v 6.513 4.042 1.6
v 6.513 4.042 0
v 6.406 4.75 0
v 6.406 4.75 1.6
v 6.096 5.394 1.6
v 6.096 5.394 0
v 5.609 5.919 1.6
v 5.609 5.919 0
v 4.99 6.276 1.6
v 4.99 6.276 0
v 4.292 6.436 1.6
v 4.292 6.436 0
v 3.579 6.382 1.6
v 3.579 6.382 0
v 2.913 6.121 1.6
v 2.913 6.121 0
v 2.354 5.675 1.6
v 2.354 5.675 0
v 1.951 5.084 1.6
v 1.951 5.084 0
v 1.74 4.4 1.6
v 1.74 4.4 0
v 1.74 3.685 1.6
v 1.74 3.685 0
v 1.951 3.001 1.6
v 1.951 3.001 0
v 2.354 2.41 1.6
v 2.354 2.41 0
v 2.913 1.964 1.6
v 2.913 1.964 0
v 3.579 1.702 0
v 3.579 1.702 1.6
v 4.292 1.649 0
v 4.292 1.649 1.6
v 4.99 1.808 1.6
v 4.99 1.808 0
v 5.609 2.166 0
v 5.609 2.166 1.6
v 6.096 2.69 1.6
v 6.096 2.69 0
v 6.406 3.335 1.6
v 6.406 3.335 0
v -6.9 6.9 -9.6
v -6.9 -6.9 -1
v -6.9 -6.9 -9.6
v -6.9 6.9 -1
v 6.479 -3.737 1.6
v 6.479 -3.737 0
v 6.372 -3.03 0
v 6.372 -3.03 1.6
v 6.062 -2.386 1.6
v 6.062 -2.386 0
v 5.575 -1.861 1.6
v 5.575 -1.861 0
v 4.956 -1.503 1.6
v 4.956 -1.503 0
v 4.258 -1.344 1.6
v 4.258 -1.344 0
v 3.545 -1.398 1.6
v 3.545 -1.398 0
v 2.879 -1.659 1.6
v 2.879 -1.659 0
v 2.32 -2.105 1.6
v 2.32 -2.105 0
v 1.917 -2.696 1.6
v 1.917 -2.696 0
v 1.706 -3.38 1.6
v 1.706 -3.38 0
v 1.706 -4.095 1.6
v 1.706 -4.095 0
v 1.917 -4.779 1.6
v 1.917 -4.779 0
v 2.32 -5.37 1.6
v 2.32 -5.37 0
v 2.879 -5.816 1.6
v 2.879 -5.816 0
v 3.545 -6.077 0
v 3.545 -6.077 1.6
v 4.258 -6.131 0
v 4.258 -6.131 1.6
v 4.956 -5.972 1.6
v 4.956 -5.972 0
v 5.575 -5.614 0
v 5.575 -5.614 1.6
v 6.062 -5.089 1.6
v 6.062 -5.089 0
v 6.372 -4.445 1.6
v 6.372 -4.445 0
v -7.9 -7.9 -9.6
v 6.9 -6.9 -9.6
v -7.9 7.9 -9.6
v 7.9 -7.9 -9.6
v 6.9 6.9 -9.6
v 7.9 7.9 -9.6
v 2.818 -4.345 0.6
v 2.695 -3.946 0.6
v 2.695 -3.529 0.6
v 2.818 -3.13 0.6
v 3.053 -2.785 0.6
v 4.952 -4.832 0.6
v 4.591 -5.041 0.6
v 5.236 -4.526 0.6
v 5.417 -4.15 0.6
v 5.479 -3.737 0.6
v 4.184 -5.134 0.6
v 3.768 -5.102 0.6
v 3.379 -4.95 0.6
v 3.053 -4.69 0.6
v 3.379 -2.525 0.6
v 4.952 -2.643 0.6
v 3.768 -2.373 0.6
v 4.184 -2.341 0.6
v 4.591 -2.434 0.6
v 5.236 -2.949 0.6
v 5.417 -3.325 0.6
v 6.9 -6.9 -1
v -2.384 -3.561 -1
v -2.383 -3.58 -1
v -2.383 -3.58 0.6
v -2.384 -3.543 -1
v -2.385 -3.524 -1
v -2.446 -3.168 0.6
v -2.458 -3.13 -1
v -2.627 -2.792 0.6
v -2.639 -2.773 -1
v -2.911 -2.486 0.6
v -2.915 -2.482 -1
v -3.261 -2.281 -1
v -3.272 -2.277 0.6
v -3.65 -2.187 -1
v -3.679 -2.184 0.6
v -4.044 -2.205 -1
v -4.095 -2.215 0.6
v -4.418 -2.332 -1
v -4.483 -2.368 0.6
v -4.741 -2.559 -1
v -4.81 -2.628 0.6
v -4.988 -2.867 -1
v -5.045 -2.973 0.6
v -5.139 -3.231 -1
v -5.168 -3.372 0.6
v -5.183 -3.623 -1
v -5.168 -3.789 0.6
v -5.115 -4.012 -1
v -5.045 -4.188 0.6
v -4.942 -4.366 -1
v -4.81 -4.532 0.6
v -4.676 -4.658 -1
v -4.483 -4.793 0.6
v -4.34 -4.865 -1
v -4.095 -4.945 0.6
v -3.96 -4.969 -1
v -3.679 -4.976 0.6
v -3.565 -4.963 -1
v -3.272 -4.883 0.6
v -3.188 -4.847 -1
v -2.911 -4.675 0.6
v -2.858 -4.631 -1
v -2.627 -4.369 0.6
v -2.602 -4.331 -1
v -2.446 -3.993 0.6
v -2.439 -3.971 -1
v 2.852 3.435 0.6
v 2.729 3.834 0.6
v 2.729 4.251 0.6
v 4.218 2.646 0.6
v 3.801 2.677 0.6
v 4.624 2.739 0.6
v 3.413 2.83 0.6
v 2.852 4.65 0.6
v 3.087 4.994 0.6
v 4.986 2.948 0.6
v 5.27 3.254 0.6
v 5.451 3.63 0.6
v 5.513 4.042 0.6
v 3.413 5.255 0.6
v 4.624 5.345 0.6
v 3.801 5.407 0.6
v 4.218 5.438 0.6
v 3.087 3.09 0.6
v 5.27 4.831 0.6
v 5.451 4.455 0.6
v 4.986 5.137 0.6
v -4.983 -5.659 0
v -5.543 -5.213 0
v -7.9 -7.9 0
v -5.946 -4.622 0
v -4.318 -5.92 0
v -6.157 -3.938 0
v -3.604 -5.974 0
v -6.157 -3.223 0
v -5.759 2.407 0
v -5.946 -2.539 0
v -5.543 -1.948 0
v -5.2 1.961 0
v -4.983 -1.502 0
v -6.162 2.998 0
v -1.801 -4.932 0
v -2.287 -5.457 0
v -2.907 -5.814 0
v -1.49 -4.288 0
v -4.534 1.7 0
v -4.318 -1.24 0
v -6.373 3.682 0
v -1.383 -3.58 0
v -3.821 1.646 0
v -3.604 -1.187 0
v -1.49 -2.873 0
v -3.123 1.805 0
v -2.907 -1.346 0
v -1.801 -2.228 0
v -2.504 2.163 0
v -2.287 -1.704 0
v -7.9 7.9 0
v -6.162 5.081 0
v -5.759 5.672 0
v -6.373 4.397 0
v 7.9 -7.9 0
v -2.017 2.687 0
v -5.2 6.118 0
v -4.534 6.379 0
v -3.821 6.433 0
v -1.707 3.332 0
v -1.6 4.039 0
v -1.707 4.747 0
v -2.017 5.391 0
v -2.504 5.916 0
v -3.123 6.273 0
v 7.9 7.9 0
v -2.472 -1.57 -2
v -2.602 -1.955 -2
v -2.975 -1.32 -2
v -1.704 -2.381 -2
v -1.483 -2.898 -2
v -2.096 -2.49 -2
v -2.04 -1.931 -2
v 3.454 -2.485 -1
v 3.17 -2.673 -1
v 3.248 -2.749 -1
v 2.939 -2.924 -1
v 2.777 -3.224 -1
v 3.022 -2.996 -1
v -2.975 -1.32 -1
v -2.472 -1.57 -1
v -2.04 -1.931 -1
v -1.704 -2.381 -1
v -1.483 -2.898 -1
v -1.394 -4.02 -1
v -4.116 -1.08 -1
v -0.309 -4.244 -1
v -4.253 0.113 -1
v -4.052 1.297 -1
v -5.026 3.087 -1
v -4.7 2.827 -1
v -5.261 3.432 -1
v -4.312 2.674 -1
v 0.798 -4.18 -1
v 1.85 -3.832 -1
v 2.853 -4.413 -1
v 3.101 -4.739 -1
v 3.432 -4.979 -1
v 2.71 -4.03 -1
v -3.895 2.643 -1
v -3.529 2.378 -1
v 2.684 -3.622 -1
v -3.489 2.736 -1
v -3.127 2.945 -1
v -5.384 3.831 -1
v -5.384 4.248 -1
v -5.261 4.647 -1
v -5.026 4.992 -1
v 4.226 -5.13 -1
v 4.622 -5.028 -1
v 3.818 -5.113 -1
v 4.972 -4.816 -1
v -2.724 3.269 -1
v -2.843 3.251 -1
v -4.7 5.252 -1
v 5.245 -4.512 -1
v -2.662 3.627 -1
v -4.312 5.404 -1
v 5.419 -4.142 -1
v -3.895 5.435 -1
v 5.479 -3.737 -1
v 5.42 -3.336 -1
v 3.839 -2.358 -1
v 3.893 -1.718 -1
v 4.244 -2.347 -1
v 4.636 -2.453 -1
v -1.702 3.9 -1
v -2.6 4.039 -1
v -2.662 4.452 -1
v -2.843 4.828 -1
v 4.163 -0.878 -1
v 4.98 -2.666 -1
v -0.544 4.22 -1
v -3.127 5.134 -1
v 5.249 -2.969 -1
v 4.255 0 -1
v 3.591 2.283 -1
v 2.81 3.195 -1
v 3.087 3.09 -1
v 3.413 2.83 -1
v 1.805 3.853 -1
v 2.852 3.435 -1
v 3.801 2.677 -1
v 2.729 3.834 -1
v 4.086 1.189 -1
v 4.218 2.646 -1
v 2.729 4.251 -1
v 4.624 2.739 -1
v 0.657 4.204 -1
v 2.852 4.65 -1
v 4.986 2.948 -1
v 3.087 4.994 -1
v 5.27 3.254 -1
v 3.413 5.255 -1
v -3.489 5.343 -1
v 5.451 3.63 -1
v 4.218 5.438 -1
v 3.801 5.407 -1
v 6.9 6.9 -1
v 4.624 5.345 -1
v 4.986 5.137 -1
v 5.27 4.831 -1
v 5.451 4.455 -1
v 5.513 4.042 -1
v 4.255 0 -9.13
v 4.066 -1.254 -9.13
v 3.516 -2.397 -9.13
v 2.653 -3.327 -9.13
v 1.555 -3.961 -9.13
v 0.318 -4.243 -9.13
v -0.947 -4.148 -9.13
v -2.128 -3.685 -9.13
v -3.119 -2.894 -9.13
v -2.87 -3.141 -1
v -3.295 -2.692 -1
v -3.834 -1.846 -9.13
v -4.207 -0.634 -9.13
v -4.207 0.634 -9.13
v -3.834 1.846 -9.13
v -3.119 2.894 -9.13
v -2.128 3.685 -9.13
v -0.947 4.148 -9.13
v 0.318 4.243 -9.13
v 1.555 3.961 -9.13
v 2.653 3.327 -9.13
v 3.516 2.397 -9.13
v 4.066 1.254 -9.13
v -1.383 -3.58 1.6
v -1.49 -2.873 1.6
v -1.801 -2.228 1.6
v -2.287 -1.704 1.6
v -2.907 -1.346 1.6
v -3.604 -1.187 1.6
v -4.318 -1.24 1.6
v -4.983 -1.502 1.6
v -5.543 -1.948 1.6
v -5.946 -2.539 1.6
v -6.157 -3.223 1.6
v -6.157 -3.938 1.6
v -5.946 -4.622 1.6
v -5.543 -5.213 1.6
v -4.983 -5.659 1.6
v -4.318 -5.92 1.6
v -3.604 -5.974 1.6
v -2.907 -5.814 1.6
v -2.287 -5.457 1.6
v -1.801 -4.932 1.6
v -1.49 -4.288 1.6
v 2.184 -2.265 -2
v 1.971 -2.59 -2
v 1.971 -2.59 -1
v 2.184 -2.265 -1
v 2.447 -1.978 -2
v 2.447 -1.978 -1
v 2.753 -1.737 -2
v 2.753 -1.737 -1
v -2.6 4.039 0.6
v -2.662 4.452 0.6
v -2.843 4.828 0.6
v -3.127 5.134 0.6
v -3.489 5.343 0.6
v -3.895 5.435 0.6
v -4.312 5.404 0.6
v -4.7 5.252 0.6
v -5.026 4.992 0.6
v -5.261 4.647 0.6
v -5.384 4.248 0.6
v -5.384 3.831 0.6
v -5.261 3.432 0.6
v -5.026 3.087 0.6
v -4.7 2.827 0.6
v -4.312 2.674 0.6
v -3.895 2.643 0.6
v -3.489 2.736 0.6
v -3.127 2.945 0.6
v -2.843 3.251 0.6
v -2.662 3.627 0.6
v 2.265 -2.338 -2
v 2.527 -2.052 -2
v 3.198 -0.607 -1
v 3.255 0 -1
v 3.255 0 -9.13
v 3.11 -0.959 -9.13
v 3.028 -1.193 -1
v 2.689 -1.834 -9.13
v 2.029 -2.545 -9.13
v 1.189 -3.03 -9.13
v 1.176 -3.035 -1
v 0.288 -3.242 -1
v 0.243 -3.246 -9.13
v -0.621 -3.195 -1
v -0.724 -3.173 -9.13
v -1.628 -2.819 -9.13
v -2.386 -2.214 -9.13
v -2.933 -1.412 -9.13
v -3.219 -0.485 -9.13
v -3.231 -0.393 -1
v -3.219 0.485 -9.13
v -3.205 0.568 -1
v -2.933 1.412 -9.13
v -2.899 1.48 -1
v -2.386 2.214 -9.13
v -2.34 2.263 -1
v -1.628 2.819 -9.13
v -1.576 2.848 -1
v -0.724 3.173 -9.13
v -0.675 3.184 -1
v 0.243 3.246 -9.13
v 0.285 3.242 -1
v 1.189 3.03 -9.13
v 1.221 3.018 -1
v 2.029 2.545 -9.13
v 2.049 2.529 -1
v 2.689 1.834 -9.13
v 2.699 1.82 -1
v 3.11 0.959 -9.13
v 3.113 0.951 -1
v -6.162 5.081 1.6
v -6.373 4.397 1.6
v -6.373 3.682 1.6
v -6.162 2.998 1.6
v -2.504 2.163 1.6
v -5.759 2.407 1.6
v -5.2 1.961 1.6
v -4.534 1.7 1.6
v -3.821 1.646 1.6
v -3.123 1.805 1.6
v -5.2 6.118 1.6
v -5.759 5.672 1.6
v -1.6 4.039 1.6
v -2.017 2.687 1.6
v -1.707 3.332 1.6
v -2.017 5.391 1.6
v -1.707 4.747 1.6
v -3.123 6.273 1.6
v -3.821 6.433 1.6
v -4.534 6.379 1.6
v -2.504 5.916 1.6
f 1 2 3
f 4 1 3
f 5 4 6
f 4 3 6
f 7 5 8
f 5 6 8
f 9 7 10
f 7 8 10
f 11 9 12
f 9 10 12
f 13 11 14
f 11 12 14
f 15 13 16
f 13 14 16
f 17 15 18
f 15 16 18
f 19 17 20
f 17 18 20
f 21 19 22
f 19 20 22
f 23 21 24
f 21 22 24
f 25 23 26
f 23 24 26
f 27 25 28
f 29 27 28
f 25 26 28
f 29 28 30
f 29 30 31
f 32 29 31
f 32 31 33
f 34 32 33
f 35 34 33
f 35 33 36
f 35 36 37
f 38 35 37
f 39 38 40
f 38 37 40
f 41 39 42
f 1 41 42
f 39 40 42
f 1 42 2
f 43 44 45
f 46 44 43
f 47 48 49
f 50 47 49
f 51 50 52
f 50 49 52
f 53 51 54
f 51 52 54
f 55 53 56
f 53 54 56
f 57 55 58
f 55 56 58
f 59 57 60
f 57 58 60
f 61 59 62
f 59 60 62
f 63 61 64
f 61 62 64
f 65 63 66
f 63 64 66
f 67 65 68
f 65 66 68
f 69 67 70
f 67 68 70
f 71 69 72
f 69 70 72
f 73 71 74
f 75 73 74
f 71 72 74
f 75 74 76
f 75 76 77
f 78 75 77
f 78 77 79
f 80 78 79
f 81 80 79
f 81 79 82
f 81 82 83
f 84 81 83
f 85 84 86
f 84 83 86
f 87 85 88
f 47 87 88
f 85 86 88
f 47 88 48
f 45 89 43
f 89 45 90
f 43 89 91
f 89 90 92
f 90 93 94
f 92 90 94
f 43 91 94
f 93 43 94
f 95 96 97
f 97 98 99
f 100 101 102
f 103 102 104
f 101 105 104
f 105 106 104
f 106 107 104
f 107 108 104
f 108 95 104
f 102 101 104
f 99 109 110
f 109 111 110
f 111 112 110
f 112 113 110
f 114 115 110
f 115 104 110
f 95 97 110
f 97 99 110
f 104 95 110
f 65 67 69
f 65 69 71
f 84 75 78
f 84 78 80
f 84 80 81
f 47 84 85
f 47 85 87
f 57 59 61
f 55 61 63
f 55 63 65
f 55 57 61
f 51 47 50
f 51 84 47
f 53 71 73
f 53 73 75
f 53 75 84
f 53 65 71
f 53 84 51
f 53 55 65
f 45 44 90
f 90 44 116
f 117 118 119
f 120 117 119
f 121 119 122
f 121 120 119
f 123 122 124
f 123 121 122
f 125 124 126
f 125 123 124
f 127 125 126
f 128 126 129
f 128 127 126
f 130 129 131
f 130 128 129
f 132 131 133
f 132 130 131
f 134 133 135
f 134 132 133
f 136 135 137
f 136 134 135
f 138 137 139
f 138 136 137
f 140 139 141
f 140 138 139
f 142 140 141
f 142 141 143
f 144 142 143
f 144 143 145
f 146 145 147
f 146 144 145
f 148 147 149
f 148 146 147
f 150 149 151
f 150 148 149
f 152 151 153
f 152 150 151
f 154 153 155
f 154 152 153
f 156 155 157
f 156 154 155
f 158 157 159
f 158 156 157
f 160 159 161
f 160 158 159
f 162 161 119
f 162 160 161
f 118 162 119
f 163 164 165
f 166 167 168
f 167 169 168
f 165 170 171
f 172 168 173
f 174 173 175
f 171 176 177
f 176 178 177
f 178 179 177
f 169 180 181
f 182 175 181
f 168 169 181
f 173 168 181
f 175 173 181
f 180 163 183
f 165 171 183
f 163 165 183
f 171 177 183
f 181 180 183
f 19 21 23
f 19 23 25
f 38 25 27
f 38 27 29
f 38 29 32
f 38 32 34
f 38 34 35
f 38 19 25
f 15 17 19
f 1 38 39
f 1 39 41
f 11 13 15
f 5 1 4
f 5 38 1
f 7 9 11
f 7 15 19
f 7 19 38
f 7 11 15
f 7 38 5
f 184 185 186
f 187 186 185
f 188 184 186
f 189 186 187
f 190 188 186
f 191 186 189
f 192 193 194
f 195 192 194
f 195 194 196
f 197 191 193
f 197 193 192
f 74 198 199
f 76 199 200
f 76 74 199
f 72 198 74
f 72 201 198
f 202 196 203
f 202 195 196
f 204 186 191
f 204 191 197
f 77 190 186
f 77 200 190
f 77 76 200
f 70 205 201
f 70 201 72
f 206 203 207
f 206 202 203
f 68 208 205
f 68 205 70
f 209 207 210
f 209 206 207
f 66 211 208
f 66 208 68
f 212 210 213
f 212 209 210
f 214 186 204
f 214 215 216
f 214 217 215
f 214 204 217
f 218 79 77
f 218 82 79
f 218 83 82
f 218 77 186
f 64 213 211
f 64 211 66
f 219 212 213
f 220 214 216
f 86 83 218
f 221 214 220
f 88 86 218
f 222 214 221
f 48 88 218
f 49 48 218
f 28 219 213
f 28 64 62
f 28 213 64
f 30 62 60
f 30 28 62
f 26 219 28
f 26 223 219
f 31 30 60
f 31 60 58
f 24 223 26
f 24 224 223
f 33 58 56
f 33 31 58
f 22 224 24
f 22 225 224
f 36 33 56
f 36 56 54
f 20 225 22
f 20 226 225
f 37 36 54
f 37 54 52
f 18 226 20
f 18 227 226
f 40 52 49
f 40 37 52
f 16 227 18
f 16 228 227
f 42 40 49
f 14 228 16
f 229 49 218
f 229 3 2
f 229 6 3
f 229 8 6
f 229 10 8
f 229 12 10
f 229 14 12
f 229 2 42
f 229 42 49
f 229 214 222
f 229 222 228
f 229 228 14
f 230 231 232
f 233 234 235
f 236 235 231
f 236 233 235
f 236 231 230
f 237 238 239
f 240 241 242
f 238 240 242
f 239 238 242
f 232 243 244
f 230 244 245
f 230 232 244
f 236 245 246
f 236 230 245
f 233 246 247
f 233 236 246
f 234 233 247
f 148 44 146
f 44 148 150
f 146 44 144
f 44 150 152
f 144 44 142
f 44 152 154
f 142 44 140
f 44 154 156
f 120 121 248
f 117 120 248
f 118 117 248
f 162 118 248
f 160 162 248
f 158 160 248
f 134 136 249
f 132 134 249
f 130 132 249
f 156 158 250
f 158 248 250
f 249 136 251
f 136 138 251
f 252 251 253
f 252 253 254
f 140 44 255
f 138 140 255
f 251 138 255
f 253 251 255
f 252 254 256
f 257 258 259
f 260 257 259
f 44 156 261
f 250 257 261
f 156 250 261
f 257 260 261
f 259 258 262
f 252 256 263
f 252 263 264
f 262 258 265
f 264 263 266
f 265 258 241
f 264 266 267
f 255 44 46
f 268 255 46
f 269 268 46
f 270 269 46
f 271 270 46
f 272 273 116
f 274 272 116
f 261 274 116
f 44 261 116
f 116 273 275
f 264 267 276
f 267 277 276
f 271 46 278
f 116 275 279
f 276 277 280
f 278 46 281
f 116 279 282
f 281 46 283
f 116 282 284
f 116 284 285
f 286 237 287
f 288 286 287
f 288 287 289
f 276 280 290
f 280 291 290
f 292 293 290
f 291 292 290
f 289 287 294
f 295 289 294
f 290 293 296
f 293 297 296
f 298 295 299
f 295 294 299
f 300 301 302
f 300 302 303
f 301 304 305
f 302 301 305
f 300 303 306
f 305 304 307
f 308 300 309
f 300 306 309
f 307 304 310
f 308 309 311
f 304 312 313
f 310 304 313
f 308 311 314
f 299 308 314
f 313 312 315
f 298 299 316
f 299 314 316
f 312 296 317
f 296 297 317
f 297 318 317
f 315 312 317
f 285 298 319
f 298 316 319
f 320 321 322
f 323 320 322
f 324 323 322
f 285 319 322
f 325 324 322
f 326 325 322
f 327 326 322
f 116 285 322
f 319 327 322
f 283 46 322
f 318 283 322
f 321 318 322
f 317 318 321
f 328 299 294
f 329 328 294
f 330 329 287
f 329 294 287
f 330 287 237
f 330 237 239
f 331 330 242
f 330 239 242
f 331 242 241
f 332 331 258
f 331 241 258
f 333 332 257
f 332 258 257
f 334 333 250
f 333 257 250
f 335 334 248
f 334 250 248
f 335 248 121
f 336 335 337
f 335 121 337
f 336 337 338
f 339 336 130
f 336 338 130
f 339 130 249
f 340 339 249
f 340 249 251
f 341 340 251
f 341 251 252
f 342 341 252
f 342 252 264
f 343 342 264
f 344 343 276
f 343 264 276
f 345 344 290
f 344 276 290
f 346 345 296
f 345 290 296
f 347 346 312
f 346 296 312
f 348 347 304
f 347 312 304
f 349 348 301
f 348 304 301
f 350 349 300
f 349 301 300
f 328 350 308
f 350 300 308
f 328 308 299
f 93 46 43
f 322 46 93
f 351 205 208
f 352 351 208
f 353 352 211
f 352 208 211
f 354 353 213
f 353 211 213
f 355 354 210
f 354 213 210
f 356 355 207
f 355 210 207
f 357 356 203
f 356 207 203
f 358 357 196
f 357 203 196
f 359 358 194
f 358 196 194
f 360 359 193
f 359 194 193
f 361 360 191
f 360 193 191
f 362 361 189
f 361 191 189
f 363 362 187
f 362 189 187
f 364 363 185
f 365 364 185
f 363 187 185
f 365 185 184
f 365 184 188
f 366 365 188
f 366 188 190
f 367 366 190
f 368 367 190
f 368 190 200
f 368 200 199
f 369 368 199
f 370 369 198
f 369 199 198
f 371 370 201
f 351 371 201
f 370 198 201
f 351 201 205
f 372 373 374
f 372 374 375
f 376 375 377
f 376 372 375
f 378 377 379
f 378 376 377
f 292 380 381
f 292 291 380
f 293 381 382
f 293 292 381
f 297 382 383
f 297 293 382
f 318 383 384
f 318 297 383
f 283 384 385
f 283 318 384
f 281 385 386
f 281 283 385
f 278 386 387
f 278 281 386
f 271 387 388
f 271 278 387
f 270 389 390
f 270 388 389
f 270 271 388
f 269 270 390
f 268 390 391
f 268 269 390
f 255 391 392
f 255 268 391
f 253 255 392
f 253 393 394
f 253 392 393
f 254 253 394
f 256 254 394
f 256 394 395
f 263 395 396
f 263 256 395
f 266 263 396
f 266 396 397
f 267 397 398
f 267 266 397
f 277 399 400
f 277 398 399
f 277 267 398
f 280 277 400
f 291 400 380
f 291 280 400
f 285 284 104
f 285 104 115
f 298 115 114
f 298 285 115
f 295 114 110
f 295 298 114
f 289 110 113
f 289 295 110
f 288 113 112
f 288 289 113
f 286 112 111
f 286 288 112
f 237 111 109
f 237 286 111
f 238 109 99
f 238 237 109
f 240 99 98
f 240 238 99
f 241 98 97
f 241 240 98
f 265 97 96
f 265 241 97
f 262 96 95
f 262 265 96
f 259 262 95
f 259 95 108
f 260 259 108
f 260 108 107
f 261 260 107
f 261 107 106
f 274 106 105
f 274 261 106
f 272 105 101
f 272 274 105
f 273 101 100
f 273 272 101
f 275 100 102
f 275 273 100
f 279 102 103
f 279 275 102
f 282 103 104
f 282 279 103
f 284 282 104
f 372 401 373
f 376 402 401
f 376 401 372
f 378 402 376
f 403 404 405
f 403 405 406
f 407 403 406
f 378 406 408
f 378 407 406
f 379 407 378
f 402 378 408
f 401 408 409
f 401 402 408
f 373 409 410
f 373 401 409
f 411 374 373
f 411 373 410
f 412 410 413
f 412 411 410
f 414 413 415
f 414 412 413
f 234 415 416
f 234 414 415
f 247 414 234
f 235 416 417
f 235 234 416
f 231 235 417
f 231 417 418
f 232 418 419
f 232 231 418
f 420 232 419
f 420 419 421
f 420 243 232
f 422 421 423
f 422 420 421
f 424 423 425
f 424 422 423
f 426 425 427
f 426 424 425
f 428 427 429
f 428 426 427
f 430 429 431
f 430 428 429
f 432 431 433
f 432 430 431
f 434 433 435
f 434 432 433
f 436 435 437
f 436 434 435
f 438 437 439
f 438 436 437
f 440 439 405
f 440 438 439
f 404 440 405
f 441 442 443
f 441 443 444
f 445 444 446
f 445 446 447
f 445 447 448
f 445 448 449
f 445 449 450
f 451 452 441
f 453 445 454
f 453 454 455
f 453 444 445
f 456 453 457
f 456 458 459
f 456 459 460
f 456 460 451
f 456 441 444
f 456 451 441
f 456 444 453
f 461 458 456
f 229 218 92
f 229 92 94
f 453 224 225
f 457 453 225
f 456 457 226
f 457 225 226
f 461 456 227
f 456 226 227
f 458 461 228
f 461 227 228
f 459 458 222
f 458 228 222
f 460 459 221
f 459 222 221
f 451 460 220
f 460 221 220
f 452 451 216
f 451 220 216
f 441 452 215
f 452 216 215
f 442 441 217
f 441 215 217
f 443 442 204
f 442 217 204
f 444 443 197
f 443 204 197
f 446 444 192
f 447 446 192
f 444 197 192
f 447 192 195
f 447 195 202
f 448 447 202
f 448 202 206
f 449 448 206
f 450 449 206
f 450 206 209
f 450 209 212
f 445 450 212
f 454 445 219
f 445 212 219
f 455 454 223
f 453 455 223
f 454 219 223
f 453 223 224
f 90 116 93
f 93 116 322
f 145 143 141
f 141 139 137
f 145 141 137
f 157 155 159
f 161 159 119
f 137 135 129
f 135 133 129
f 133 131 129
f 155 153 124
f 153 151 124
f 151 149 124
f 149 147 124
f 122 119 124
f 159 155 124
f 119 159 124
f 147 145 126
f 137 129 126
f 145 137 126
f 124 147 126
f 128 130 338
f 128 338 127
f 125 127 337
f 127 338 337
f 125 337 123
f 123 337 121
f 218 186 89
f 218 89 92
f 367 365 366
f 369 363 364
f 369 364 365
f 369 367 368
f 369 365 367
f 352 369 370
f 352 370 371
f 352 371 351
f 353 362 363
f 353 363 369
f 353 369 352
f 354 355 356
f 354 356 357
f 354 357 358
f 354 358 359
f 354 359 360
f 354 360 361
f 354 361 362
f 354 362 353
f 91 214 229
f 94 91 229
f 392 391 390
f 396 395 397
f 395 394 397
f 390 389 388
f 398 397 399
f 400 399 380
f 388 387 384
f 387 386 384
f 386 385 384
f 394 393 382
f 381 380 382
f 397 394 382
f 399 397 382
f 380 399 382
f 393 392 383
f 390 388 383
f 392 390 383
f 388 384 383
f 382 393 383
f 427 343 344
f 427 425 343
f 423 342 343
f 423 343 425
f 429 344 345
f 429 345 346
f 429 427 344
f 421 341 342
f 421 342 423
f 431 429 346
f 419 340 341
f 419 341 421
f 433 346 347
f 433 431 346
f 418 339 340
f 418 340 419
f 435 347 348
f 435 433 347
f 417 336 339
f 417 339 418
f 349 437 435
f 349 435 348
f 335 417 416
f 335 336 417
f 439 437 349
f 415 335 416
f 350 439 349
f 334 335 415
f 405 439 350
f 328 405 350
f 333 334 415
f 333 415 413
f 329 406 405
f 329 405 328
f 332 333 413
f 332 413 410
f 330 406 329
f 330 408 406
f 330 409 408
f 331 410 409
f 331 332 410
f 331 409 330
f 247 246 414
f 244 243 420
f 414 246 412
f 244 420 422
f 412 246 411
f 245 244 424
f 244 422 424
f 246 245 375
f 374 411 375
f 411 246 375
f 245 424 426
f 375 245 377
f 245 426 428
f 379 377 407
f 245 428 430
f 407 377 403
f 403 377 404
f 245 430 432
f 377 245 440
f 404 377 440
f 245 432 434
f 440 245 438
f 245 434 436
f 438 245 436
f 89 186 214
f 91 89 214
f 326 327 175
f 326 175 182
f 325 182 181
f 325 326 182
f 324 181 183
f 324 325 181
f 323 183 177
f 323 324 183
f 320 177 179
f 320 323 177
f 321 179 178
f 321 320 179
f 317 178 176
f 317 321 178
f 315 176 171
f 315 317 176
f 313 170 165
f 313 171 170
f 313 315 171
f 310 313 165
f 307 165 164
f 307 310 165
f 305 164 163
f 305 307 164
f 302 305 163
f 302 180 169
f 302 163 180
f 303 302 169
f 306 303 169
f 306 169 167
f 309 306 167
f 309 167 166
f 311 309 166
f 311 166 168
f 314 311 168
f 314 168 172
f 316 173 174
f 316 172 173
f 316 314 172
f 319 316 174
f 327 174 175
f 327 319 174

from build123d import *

# Parameters (mm, degrees)
F0_W          = 15.8
F0_H          = 15.8
F1_DEPTH      = 9.6
F4_R          = 2.4
F6_DEPTH      = 1.6
F5_R          = 2.4
F7_DEPTH      = 1.6
F3_R          = 2.4
F8_DEPTH      = 1.6
F2_R          = 2.4
F9_DEPTH      = 1.6
F10_T         = -1
F11_R         = 4.255
F12_DEPTH     = 8.13
F13_T         = 1
F13_T3_DEPTH  = 10.6
F13_T5_DEPTH  = 15.8
F13_T7_DEPTH  = 15.8
F13_T18_ANGLE = 35.7281901551
F13_T20_ANGLE = 210.9230732258
F13_T22_ANGLE = 74.818128958
F13_T24_ANGLE = 41.9866867229
F13_T28_ANGLE = 82.2344866513


# Not quite as in the source:
# - a shell that OpenCascade refuses in one call is made with other operations: the cavity is built on its own and cut out


with BuildPart() as f1:
    # F0 (on Top) → F1 (new body)
    with BuildSketch(Plane.XY):
        Rectangle(F0_W, F0_H)
    extrude(amount=-F1_DEPTH)

    # F4 (on face) → F6 (join)
    with BuildSketch(Plane.XY):
        with Locations((-3.7834926043, -3.5802270286)):
            Circle(F4_R)
    extrude(amount=F6_DEPTH)

    # F5 (on face) → F7 (join)
    with BuildSketch(Plane.XY):
        with Locations((4.0790652856, -3.737478517)):
            Circle(F5_R)
    extrude(amount=F7_DEPTH)

    # F3 (on face) → F8 (join)
    with BuildSketch(Plane.XY):
        with Locations((4.1130073369, 4.042240791)):
            Circle(F3_R)
    extrude(amount=F8_DEPTH)

    # F2 (on face) + F3 (on face) → F9 (join)
    with BuildSketch(Plane.XY):
        with Locations((-4.0000770241, 4.039389547)):
            Circle(F2_R)
    with BuildSketch(Plane.XY):
        with Locations((4.1130073369, 4.042240791)):
            Circle(F3_R)
    extrude(amount=F9_DEPTH)

    # F10
    f10_openings = [f1.faces().sort_by_distance(p)[0] for p in [
        (0, 0, -9.6),
    ]]
    offset(amount=F10_T, openings=f10_openings, kind=Kind.INTERSECTION)

    # F11 (on face) → F12 (join)
    with BuildSketch(Plane(origin=(0, 0, -1), x_dir=(1, 0, 0), z_dir=(0, 0, -1))):
        Circle(F11_R)
    extrude(amount=F12_DEPTH)

    # F13: shell of thickness 1, made by hand


with BuildPart() as f13_core1:
    # F13_t2: copy of F1
    add(f1.part)

    # the walls: a layer under each face that stays
    f13_faces = [f13_core1.faces().sort_by_distance(p)[0] for p in [
        (7.9, 0, -4.8),
        (0, -7.9, -4.8),
        (0, 7.9, -4.8),
        (0, 0, 0),
        (-7.3733333333, -7.3733333333, -9.6),
        (-7.9, 0, -4.8),
        (-6.1834926043, -3.5802270286, 0.8),
        (1.6790652856, -3.737478517, 0.8),
        (-6.4000770241, 4.039389547, 0.8),
        (1.7130073369, 4.042240791, 0.8),
        (6.9, 0, -5.3),
        (0, -6.9, -5.3),
        (-6.9, 0, -5.3),
        (0, 6.9, -5.3),
        (-3.7834926043, -3.5802270286, 1.6),
        (4.0790652856, -3.737478517, 1.6),
        (-4.0000770241, 4.039389547, 1.6),
        (4.1130073369, 4.042240791, 1.6),
        (-4.6, 0, -1),
        (2.6790652856, -3.737478517, -0.2),
        (-4.255, 0, -5.065),
        (-5.1834926043, -3.5802270286, -0.2),
        (-5.4000770241, 4.039389547, -0.2),
        (2.7130073369, 4.042240791, -0.2),
        (3.1153566982, -2.8544722668, -1),
        (4.0790652856, -3.737478517, 0.6),
        (-3.0174039644, -2.8552959816, -1),
        (-3.7834926043, -3.5802270286, 0.6),
        (-4.0000770241, 4.039389547, 0.6),
        (4.1130073369, 4.042240791, 0.6),
    ]]
    thicken(f13_faces, amount=-F13_T, mode=Mode.SUBTRACT)

    # F13_s4 → F13_t3 (cut)
    with BuildSketch(Plane.XY.offset(-10.6)):
        Polygon((6.89, -6.89), (7.9, -6.9), (7.9, -7.9), (6.9, -7.9), align=None)
        Polygon((6.89, 6.89), (7.9, 6.9), (7.9, 7.9), (6.9, 7.9), align=None)
        Polygon((-6.89, -6.89), (-6.9, -7.9), (-7.9, -7.9), (-7.9, -6.9), align=None)
        Polygon((-6.89, 6.89), (-7.9, 6.9), (-7.9, 7.9), (-6.9, 7.9), align=None)
    extrude(amount=F13_T3_DEPTH, mode=Mode.SUBTRACT)

    # F13_s6 → F13_t5 (cut)
    with BuildSketch(Plane.XZ.offset(-7.9)):
        Polygon((6.89, -1.01), (7.9, -1), (7.9, 0), (6.9, 0), align=None)
        Polygon((-6.89, -1.01), (-7.9, -1), (-7.9, 0), (-6.9, 0), align=None)
    extrude(amount=F13_T5_DEPTH, mode=Mode.SUBTRACT)

    # F13_s8 → F13_t7 (cut)
    with BuildSketch(Plane.YZ.offset(-7.9)):
        Polygon((-6.89, -1.01), (-7.9, -1), (-7.9, 0), (-6.9, 0), align=None)
        Polygon((6.89, -1.01), (7.9, -1), (7.9, 0), (6.9, 0), align=None)
    extrude(amount=F13_T7_DEPTH, mode=Mode.SUBTRACT)

    # F13_s9 → F13_t10 (revolve, cut)
    with BuildSketch(Plane.XZ.offset(3.5802270286)):
        Polygon((-1.3734926043, 0.01), (-1.3834926043, -1), (-2.3834926043, -1), (-2.3834926043, 0), align=None)
    revolve(axis=Axis((-3.7834926043, -3.5802270286, 0), (0, 0, 1)), mode=Mode.SUBTRACT)

    # F13_s11 → F13_t12 (revolve, cut)
    with BuildSketch(Plane.XZ.offset(3.737478517)):
        Polygon((6.4890652856, 0.01), (6.4790652856, -1), (5.4790652856, -1), (5.4790652856, 0), align=None)
    revolve(axis=Axis((4.0790652856, -3.737478517, 0), (0, 0, 1)), mode=Mode.SUBTRACT)

    # F13_s13 → F13_t14 (revolve, cut)
    with BuildSketch(Plane.XZ.offset(-4.039389547)):
        Polygon((-1.5900770241, 0.01), (-1.6000770241, -1), (-2.6000770241, -1), (-2.6000770241, 0), align=None)
    revolve(axis=Axis((-4.0000770241, 4.039389547, 0), (0, 0, 1)), mode=Mode.SUBTRACT)

    # F13_s15 → F13_t16 (revolve, cut)
    with BuildSketch(Plane.XZ.offset(-4.042240791)):
        Polygon((6.5230073369, 0.01), (6.5130073369, -1), (5.5130073369, -1), (5.5130073369, 0), align=None)
    revolve(axis=Axis((4.1130073369, 4.042240791, 0), (0, 0, 1)), mode=Mode.SUBTRACT)

    # F13_s17 → F13_t18 (revolve, cut)
    with BuildSketch(Plane.XZ):
        Polygon((4.265, -1.01), (4.255, 0), (3.255, 0), (3.255, -1), align=None)
    revolve(axis=Axis((0, 0, -1), (0, 0, -1)), revolution_arc=F13_T18_ANGLE, mode=Mode.SUBTRACT)

    # F13_s19 → F13_t20 (revolve, cut)
    with BuildSketch(Plane(origin=(0, 0, 0), x_dir=(0, 0, 1), z_dir=(0.5138867564, -0.8578580312, 0))):
        Polygon((-1.01, 4.265), (0, 4.255), (0, 3.255), (-1, 3.255), align=None)
    revolve(axis=Axis((0, 0, -1), (0, 0, -1)), revolution_arc=F13_T20_ANGLE, mode=Mode.SUBTRACT)

    # F13_s21 → F13_t22 (revolve, cut)
    with BuildSketch(Plane(origin=(0, 0, 0), x_dir=(0, 0, 1), z_dir=(0.7577618984, 0.6525311528, 0))):
        Polygon((-1.01, 4.265), (0, 4.255), (0, 3.255), (-1, 3.255), align=None)
    revolve(axis=Axis((0, 0, -1), (0, 0, -1)), revolution_arc=F13_T22_ANGLE, mode=Mode.SUBTRACT)

    # F13_s23 → F13_t24 (revolve, cut)
    with BuildSketch(Plane(origin=(-0.7265604619, -1.8440663308, 0), x_dir=(0, 0, 1), z_dir=(-0.3665725996, -0.9303894503, 0))):
        Polygon((-0.99, -3.7751765248), (-1, -2.7651765248), (-2, -2.7651765248), (-2, -3.7651765248), align=None)
    revolve(axis=Axis((4.0790652856, -3.737478517, -1), (0, 0, -1)), revolution_arc=F13_T24_ANGLE, mode=Mode.SUBTRACT)

    # F13_s25 → F13_t26 (revolve, cut)
    with BuildSketch(Plane.XZ.offset(3.737478517)):
        Polygon((5.4690652856, 0.59), (6.4790652856, 0.6), (6.4790652856, 1.6), (5.4790652856, 1.6), align=None)
    revolve(axis=Axis((4.0790652856, -3.737478517, 0.6), (0, 0, -1)), mode=Mode.SUBTRACT)

    # F13_s27 → F13_t28 (revolve, cut)
    with BuildSketch(Plane(origin=(-3.4098320419, 0.3261629687, 0), x_dir=(0, 0, 1), z_dir=(-0.9954563431, 0.0952190583, 0))):
        Polygon((-0.99, -2.5342203081), (-1, -1.5242203081), (-2, -1.5242203081), (-2, -2.5242203081), align=None)
    revolve(axis=Axis((-3.7834926043, -3.5802270286, -1), (0, 0, -1)), revolution_arc=F13_T28_ANGLE, mode=Mode.SUBTRACT)

    # F13_s29 → F13_t30 (revolve, cut)
    with BuildSketch(Plane.XZ.offset(3.5802270286)):
        Polygon((-2.3934926043, 0.59), (-1.3834926043, 0.6), (-1.3834926043, 1.6), (-2.3834926043, 1.6), align=None)
    revolve(axis=Axis((-3.7834926043, -3.5802270286, 0.6), (0, 0, -1)), mode=Mode.SUBTRACT)

    # F13_s31 → F13_t32 (revolve, cut)
    with BuildSketch(Plane.XZ.offset(-4.039389547)):
        Polygon((-2.6100770241, 0.59), (-1.6000770241, 0.6), (-1.6000770241, 1.6), (-2.6000770241, 1.6), align=None)
    revolve(axis=Axis((-4.0000770241, 4.039389547, 0.6), (0, 0, -1)), mode=Mode.SUBTRACT)

    # F13_s33 → F13_t34 (revolve, cut)
    with BuildSketch(Plane.XZ.offset(-4.042240791)):
        Polygon((5.5030073369, 0.59), (6.5130073369, 0.6), (6.5130073369, 1.6), (5.5130073369, 1.6), align=None)
    revolve(axis=Axis((4.1130073369, 4.042240791, 0.6), (0, 0, -1)), mode=Mode.SUBTRACT)


with BuildPart() as f1_1:
    add(f1.part)

    # what is left inside the walls is the cavity
    f13_cavity = [f13_core1.part.solids().sort_by_distance(p)[0] for p in [
        (-3.245, 0, -6.42),
    ]]
    add(f13_cavity, mode=Mode.SUBTRACT)


solid = f1_1.part
